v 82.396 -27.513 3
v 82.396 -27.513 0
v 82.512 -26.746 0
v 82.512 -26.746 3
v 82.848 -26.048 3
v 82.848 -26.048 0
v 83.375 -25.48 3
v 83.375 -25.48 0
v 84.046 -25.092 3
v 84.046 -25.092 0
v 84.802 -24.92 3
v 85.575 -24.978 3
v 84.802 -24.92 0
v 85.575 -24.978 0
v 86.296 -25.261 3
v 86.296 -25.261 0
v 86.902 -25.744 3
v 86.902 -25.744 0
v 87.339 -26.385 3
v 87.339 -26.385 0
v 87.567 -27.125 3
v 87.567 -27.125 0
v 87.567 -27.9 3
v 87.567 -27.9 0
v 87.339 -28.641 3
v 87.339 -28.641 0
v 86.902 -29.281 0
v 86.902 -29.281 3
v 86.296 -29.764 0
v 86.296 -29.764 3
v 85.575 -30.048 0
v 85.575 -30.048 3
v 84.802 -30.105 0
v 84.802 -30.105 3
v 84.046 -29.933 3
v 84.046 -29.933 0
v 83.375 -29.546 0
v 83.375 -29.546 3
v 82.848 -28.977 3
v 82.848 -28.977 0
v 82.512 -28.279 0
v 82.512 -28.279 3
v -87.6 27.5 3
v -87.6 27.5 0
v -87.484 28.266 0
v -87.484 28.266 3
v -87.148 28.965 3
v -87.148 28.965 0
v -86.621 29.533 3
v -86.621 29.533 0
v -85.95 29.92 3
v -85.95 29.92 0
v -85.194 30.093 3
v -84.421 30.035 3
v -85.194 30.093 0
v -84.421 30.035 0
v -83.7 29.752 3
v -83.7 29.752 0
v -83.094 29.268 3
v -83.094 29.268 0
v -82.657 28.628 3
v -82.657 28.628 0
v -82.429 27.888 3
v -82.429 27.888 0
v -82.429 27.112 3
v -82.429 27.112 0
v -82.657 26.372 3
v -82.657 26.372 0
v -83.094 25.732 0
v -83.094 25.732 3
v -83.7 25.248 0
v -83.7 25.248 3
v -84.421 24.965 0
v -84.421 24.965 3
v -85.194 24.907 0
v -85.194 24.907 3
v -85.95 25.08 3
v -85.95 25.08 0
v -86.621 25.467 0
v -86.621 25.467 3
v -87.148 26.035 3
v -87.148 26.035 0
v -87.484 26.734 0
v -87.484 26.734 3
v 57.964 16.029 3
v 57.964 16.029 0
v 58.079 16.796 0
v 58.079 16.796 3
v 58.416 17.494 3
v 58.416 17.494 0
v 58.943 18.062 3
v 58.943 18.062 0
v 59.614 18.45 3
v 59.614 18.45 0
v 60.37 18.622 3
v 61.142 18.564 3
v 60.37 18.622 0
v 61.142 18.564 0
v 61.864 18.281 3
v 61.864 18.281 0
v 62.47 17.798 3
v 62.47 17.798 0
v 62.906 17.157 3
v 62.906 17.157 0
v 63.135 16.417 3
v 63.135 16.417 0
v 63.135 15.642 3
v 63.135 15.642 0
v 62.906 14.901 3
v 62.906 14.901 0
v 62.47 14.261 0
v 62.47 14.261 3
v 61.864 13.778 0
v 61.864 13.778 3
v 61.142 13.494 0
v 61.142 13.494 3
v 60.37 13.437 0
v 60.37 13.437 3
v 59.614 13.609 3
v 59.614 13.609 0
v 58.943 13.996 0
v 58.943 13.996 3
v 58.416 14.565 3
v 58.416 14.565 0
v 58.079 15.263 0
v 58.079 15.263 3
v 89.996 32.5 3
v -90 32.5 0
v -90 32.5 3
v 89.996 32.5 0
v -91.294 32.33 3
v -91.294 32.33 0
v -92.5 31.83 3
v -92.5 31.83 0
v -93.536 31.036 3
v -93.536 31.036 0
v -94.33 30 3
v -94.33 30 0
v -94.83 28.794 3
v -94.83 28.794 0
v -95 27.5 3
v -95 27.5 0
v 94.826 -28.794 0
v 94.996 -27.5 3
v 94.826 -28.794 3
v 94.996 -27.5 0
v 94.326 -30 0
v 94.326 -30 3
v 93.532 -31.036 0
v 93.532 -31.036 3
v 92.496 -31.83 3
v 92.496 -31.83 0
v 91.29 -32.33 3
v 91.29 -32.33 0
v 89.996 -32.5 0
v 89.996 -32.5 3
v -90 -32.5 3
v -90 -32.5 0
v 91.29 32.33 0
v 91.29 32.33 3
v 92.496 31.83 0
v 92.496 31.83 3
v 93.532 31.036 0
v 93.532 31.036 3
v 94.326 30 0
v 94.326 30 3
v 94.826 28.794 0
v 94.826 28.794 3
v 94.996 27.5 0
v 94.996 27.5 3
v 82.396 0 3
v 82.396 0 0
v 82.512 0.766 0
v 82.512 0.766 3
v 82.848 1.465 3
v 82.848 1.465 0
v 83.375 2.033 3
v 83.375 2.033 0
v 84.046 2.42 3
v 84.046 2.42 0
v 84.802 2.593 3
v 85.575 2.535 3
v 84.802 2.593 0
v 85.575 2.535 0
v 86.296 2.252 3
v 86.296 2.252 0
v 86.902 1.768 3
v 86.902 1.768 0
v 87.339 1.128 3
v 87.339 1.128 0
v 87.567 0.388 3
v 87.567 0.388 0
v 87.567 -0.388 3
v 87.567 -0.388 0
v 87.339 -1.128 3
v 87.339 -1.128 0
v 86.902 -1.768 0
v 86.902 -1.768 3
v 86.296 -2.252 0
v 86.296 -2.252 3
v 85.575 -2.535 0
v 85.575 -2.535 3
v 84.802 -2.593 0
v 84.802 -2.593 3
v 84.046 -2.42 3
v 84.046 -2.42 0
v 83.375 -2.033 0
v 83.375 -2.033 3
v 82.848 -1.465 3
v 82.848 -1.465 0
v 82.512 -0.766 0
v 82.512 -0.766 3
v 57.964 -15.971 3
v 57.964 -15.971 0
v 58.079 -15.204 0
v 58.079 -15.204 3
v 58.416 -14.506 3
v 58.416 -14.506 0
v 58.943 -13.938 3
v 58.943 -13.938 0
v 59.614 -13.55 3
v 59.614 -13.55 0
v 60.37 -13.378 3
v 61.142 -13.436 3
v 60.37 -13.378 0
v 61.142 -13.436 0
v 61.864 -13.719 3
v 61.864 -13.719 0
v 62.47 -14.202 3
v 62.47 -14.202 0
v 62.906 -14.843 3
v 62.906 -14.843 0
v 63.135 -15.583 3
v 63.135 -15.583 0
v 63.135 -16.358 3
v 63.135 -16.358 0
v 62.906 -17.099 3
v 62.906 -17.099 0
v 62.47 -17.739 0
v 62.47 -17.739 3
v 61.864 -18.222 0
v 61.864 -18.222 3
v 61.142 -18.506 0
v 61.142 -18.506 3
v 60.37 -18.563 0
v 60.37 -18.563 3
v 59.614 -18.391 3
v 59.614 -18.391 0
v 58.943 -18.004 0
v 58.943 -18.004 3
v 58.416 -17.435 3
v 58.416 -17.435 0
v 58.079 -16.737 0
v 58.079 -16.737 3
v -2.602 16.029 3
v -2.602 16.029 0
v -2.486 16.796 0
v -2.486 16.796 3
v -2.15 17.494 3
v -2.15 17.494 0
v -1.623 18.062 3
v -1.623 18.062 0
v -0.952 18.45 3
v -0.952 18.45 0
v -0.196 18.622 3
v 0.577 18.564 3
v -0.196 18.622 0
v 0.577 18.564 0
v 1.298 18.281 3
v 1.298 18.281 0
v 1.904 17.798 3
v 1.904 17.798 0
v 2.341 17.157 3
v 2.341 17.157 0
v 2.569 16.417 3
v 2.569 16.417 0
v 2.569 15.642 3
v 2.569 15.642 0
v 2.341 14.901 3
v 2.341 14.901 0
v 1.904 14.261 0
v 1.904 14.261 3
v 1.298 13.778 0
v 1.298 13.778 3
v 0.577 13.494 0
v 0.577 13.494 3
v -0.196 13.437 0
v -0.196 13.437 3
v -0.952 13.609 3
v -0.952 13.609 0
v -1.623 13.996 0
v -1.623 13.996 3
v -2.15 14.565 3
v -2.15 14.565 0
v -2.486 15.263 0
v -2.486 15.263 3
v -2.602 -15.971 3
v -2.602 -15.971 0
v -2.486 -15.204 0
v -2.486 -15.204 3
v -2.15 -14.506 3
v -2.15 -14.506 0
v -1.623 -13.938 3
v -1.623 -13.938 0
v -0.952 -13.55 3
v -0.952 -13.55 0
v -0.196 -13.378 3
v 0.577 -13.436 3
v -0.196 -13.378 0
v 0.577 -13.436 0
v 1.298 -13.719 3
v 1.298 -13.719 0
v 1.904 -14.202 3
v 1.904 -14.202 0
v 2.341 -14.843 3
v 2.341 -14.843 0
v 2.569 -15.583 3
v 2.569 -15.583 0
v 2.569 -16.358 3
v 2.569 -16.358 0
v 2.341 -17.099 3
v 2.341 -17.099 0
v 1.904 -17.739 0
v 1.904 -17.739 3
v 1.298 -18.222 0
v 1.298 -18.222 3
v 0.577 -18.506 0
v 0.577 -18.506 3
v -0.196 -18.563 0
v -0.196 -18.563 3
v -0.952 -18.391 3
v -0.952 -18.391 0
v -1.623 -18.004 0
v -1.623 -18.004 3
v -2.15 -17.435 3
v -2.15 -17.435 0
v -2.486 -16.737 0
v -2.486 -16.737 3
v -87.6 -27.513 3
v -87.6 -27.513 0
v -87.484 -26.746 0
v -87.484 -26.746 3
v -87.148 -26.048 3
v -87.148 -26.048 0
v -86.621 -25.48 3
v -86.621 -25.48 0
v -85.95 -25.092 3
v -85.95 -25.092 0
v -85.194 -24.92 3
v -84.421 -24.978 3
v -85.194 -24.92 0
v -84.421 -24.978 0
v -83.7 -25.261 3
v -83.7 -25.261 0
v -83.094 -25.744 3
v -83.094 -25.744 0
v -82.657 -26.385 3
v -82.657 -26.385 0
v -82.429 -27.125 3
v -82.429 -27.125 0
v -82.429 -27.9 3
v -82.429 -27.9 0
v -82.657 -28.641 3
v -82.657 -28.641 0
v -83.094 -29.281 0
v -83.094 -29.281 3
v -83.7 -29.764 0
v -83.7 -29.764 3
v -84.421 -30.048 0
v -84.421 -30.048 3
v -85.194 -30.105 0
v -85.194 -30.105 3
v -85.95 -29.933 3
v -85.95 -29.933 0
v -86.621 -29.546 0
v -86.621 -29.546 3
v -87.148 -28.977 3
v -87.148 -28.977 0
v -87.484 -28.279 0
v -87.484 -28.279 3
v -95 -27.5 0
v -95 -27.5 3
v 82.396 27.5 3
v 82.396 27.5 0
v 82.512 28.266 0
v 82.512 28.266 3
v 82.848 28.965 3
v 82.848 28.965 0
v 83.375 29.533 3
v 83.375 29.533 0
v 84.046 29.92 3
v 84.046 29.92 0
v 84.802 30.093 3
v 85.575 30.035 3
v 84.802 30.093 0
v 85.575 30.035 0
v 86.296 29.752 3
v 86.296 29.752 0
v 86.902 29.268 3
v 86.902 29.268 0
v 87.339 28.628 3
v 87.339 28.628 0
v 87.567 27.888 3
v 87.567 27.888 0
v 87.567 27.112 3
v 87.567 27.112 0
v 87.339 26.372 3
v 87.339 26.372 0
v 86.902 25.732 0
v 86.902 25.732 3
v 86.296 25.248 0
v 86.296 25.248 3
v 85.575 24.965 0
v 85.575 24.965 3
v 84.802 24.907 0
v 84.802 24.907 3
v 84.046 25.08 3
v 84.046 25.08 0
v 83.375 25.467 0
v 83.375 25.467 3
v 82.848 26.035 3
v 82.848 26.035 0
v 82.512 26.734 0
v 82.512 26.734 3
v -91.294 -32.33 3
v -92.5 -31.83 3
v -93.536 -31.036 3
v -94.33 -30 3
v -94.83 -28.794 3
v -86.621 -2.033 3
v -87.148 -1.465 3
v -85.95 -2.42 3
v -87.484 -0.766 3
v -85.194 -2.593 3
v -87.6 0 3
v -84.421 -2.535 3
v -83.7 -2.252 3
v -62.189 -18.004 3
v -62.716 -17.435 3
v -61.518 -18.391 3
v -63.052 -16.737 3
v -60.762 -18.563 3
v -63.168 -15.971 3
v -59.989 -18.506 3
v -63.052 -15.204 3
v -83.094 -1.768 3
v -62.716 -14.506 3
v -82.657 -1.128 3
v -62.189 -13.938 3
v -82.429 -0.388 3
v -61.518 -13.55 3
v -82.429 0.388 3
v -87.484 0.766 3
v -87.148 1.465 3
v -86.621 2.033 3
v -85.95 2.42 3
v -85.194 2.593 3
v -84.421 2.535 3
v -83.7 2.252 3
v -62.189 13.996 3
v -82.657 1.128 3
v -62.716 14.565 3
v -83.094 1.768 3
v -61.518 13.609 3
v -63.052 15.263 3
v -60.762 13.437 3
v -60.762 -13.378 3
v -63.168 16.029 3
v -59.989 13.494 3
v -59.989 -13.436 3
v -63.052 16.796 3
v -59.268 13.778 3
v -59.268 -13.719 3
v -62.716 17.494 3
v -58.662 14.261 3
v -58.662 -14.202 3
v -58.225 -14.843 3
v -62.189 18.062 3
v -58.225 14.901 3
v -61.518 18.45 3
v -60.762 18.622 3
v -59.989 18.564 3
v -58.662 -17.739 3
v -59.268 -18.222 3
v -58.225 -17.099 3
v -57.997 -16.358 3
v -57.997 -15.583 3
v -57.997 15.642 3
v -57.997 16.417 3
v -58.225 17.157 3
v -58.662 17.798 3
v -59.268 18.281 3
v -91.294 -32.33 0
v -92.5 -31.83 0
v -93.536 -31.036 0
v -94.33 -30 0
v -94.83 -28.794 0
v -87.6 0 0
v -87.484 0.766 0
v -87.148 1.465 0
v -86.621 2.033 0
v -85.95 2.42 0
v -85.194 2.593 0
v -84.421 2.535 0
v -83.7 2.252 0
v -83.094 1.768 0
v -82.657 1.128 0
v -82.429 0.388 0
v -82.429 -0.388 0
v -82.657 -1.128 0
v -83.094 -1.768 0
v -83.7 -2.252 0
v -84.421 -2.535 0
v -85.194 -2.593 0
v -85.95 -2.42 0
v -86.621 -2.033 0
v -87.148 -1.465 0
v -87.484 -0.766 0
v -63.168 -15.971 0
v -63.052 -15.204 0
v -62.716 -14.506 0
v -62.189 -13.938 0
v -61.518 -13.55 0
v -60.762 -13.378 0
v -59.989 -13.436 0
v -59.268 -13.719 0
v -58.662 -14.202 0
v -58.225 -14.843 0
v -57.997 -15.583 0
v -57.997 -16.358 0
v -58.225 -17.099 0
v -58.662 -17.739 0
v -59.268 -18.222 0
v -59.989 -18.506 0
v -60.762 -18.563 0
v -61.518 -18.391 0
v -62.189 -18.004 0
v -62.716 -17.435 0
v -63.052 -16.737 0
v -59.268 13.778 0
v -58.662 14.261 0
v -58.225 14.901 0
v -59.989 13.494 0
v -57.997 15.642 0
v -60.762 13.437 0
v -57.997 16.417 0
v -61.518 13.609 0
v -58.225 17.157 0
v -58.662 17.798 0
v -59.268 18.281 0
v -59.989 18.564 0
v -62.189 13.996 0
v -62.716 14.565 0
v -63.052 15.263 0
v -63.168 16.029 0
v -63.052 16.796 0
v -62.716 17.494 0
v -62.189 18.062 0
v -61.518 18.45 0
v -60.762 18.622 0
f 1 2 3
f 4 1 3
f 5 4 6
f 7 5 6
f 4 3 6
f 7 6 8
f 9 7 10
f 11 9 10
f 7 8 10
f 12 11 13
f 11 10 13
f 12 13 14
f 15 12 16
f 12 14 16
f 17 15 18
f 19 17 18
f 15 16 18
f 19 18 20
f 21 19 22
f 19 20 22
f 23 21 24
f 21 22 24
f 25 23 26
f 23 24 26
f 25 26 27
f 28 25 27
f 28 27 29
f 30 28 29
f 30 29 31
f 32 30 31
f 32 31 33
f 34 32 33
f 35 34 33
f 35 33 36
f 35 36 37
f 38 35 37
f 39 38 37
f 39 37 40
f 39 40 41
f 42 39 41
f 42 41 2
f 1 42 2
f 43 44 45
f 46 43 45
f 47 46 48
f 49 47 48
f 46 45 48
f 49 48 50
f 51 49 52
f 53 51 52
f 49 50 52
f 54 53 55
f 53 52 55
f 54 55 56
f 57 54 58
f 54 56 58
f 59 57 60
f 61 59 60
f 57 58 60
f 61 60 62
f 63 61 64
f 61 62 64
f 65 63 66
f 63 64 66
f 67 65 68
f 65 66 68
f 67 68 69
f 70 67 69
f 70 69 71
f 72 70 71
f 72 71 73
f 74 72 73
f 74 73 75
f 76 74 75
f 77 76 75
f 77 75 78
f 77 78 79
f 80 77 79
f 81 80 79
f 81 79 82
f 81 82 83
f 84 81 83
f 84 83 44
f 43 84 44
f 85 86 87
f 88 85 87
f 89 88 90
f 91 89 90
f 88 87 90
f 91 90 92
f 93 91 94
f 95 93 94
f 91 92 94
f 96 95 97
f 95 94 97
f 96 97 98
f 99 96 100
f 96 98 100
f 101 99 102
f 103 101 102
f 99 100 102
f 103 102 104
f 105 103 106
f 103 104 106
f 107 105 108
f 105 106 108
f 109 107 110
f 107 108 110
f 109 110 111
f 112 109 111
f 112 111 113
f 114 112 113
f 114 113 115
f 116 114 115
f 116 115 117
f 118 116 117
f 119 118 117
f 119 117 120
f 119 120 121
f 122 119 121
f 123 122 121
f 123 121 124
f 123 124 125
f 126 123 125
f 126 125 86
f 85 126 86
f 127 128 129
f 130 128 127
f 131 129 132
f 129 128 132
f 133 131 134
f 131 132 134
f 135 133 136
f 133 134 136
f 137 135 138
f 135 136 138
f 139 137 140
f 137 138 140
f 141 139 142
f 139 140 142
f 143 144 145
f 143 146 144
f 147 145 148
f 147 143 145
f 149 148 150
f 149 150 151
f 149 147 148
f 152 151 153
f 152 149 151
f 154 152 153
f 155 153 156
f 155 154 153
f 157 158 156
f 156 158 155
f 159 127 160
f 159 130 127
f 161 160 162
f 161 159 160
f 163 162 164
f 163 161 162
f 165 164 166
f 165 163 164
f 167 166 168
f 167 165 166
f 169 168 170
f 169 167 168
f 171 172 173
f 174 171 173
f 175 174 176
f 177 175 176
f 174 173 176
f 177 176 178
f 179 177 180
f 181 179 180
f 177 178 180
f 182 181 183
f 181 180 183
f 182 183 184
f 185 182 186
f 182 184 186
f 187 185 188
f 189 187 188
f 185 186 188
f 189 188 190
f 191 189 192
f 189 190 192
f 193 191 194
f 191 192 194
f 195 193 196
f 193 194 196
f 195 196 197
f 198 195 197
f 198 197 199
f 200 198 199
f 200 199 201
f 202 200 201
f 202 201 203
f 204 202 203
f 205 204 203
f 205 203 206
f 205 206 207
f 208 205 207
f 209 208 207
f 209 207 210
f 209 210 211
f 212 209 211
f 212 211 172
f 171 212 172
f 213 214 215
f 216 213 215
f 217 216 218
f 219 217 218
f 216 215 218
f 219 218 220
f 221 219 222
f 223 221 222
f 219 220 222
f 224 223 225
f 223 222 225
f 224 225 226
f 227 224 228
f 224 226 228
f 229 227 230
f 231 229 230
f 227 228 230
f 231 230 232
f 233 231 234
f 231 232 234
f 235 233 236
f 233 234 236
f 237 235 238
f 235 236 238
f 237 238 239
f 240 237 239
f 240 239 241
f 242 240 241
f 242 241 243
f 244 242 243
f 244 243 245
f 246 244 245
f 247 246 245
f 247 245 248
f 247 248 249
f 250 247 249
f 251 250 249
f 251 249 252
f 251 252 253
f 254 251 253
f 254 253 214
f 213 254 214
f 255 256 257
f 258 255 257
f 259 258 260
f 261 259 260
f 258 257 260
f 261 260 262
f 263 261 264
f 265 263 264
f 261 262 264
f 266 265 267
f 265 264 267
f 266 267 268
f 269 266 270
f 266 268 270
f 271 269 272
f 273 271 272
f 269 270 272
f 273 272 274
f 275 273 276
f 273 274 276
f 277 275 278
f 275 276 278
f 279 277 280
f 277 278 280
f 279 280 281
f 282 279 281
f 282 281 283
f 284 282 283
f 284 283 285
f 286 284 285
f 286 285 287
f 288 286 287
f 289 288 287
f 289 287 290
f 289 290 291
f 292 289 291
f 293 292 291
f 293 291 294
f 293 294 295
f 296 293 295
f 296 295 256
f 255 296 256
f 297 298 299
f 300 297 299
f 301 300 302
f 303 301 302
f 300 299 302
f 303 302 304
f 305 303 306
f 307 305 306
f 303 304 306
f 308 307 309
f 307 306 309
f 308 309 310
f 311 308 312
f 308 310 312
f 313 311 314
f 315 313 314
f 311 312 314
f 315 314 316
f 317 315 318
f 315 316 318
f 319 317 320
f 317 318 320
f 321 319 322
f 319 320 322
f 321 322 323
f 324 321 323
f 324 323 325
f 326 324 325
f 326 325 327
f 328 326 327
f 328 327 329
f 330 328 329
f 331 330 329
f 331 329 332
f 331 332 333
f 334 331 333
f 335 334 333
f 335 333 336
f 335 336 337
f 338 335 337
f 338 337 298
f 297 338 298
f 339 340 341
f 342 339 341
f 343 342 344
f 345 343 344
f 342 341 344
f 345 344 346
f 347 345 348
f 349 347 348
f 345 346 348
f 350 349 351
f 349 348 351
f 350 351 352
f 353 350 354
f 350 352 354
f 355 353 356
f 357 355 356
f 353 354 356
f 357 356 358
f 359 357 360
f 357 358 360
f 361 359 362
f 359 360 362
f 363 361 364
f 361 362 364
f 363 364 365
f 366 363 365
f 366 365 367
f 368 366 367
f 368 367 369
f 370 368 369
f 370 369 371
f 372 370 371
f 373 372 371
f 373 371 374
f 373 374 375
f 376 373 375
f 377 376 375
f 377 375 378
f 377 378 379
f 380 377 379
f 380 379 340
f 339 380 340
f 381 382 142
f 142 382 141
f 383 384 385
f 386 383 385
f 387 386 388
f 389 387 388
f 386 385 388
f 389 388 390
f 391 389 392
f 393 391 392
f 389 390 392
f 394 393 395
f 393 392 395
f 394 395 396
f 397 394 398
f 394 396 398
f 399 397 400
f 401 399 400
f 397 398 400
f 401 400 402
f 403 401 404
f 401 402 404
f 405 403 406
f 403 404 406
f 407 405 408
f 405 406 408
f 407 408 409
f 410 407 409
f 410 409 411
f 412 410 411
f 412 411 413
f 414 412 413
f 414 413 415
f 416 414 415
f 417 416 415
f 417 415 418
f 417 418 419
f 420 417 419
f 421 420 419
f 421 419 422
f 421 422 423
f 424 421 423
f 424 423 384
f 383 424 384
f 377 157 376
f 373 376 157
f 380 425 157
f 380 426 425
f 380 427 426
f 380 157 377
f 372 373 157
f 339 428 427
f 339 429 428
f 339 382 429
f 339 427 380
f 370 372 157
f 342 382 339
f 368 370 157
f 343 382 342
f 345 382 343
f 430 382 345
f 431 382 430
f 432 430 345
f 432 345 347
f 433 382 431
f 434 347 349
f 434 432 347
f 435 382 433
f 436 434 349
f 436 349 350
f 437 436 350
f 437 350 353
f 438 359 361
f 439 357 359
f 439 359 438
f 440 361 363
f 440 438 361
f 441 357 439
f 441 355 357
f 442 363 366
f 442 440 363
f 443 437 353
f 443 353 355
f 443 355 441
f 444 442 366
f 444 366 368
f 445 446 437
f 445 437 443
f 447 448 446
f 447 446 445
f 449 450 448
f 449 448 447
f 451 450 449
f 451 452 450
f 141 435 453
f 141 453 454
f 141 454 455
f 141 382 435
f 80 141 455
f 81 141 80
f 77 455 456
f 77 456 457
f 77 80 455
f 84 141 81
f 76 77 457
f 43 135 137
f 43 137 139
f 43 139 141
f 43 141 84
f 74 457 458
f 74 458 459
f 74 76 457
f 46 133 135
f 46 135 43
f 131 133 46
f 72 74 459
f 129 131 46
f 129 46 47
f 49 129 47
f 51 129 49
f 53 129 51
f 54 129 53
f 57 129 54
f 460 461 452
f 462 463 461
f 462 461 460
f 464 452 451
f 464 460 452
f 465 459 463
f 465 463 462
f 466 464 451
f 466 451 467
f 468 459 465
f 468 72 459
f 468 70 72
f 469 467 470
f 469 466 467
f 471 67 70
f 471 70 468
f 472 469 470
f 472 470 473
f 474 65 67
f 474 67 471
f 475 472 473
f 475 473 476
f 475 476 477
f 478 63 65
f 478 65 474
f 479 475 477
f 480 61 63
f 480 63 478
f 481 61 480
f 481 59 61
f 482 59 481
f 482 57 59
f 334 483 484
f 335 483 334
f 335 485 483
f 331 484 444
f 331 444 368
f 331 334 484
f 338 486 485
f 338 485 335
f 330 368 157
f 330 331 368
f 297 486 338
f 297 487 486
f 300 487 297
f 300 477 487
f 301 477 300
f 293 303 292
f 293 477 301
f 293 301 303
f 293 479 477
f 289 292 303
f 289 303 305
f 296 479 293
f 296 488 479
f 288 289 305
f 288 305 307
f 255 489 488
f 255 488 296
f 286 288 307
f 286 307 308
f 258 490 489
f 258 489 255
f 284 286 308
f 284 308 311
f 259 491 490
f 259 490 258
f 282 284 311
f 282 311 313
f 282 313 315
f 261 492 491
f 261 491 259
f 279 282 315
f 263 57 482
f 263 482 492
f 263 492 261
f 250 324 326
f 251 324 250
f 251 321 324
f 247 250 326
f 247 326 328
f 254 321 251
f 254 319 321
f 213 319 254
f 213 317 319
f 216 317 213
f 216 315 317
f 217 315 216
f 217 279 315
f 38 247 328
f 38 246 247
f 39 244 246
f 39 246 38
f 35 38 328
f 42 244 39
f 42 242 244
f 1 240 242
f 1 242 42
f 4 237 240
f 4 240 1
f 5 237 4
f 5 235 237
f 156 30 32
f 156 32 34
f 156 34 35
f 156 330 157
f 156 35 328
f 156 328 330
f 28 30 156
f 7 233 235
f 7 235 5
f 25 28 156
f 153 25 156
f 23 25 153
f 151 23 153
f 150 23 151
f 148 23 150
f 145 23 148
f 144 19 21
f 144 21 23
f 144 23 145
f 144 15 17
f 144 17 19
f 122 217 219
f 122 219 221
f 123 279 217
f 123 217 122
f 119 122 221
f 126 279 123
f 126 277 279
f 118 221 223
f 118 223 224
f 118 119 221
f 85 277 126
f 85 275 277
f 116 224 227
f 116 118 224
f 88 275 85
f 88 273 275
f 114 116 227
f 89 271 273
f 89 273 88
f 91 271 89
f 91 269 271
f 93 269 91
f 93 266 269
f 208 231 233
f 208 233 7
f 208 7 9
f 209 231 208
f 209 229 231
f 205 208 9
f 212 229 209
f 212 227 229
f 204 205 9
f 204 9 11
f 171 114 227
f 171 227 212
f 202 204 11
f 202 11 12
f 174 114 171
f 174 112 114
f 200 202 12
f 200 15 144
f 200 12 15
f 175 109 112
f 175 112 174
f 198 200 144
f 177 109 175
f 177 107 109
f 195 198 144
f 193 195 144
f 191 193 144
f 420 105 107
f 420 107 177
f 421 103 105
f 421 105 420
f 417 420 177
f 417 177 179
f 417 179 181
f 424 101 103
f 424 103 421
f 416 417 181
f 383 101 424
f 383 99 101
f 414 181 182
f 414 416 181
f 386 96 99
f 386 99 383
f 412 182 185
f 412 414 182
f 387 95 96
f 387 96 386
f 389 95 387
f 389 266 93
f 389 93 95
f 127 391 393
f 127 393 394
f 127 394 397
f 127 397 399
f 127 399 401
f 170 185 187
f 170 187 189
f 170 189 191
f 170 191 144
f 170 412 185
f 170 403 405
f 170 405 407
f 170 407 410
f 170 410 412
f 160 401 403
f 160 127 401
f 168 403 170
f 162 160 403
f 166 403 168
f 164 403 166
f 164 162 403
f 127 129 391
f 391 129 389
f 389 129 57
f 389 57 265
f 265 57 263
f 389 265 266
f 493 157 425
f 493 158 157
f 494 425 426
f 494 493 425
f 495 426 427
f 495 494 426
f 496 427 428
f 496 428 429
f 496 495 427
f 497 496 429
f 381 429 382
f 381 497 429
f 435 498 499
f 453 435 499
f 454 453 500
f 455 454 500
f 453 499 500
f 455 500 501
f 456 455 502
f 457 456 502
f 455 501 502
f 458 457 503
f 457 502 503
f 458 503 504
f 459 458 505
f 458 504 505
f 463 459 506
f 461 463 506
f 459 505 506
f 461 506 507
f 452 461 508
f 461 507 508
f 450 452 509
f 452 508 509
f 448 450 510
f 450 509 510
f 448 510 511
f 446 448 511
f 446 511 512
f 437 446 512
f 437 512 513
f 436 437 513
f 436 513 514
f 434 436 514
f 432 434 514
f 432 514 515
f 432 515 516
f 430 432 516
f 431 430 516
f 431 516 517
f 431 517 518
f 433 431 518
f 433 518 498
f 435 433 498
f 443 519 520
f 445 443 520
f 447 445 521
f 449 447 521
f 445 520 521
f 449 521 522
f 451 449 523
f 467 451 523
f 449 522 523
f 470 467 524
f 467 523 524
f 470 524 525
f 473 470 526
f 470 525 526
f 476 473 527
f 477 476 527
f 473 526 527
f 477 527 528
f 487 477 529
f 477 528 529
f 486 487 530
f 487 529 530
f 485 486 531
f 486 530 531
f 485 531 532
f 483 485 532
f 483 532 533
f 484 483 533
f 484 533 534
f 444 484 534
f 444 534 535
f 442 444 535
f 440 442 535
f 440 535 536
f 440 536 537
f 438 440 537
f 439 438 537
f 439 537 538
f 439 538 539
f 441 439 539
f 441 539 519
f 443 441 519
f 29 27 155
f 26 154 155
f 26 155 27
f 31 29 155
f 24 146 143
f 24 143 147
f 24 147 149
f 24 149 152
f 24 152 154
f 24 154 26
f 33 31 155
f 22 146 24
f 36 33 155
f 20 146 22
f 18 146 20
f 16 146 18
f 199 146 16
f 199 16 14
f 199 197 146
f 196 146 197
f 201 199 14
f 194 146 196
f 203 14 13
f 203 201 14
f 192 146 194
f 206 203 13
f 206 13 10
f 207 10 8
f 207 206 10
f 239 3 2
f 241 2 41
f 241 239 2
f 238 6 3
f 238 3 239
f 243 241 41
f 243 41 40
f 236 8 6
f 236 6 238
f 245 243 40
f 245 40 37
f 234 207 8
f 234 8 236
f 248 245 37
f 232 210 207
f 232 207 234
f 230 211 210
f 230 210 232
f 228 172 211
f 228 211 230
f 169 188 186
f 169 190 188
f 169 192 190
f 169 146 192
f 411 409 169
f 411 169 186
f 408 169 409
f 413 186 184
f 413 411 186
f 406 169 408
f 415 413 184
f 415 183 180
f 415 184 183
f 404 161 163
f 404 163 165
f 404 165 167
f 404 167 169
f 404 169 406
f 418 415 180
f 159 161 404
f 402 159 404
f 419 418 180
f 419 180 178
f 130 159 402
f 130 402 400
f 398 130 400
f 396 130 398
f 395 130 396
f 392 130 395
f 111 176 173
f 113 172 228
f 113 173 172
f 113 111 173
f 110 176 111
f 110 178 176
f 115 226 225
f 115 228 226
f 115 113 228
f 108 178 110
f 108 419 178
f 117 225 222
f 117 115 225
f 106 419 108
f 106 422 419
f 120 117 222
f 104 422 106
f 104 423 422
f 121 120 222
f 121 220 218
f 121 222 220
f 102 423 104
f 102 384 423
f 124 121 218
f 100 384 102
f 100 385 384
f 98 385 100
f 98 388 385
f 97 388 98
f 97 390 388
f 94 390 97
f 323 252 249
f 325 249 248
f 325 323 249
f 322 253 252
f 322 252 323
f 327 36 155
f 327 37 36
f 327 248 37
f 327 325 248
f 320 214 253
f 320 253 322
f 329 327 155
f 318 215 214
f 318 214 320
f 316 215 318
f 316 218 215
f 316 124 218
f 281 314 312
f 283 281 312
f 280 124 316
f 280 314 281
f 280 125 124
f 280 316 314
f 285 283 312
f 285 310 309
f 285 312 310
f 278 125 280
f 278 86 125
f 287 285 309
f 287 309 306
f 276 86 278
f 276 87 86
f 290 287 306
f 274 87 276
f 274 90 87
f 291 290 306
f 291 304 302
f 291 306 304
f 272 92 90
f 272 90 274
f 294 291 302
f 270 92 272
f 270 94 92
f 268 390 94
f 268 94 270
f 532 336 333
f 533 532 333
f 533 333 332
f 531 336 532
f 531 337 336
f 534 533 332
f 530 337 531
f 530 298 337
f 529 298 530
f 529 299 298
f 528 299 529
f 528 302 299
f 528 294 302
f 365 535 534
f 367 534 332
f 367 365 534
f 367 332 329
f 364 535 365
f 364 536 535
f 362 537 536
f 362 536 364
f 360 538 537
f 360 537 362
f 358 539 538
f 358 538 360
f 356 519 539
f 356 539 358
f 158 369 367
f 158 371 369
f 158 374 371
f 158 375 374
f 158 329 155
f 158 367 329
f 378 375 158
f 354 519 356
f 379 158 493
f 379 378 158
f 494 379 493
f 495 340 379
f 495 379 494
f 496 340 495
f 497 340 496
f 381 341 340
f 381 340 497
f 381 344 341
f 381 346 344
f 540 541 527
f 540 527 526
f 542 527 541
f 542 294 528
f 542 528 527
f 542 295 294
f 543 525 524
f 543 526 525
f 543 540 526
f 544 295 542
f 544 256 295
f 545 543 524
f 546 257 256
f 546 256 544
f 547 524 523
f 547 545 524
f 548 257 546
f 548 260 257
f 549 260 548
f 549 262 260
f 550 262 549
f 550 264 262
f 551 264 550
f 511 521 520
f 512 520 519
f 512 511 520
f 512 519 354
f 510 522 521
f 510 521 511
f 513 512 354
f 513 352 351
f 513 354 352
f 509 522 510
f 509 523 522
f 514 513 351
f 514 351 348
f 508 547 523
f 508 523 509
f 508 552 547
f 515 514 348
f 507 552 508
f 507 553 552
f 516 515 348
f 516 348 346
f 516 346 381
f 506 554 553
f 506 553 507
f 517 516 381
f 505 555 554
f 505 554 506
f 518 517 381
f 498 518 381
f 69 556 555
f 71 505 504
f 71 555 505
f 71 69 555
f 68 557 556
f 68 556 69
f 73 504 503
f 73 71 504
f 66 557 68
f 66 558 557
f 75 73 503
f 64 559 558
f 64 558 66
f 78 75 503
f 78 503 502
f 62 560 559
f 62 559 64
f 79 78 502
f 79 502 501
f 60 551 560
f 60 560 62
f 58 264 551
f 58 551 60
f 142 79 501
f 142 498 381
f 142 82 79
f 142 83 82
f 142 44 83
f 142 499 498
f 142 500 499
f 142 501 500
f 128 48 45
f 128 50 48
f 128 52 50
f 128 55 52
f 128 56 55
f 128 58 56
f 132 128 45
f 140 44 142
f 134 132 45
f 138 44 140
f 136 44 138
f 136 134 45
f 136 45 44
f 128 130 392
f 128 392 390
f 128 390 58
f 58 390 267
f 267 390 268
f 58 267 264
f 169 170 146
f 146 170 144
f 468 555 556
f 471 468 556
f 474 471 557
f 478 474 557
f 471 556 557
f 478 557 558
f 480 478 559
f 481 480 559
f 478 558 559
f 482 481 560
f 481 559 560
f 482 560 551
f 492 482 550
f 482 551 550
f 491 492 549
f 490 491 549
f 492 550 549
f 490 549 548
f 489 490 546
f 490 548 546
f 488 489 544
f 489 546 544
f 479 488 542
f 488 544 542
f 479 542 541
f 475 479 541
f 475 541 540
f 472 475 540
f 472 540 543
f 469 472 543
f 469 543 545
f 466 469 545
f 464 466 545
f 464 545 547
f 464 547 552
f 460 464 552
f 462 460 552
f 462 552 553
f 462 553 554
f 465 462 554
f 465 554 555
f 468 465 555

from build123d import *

# Parameters (mm, degrees)
SKETCH_1_W           = 250
SKETCH_1_H           = 65
SKETCH_1_R           = 2.5
EXTRUDE_1_DEPTH      = 3
FILLET_1_R           = 3
CUT_EXTRUDE_3_DEPTH  = 4
FILLET_2_R           = 3
SKETCH_6_W           = 30
SKETCH_6_H           = 65
CUT_EXTRUDE_4_DEPTH  = 5
CUT_EXTRUDE_7_DEPTH  = 5
FILLET_3_R           = 5
SKETCH_8_R           = 2.5
EXTRUDE_2_DEPTH      = 3
SKETCH_10_R          = 2.5
CUT_EXTRUDE_8_DEPTH  = 3
SKETCH_13_R          = 2.5
EXTRUDE_3_DEPTH      = 3
SKETCH_15_R          = 2.5
EXTRUDE_4_DEPTH      = 3
SKETCH_18_R          = 2.5
CUT_EXTRUDE_11_DEPTH = 4
SKETCH_20_R          = 2.5
CUT_EXTRUDE_12_DEPTH = 10
SKETCH_21_R          = 2.6
CUT_EXTRUDE_13_DEPTH = 4


with BuildPart() as part:
    # 草图1 → 凸台-拉伸1 (new body)
    with BuildSketch(Plane.XY):
        Rectangle(SKETCH_1_W, SKETCH_1_H)
        with Locations((-70, 16)):
            Circle(SKETCH_1_R, mode=Mode.SUBTRACT)
        with Locations((-70, -16)):
            Circle(SKETCH_1_R, mode=Mode.SUBTRACT)
        with Locations((70, -16)):
            Circle(SKETCH_1_R, mode=Mode.SUBTRACT)
        with Locations((70, 16)):
            Circle(SKETCH_1_R, mode=Mode.SUBTRACT)
        with Locations((0, 16)):
            Circle(SKETCH_1_R, mode=Mode.SUBTRACT)
        with Locations((0, -16)):
            Circle(SKETCH_1_R, mode=Mode.SUBTRACT)
    extrude(amount=EXTRUDE_1_DEPTH)

    # 圆角1
    fillet_1_edges = [part.edges().sort_by_distance(p)[0] for p in [
        (125, -32.5, 1.5),
        (-125, -32.5, 1.5),
        (-125, 32.5, 1.5),
        (125, 32.5, 1.5),
    ]]
    fillet(fillet_1_edges, radius=FILLET_1_R)

    # 草图4 → 切除-拉伸3 (cut, through all)
    with BuildSketch(Plane(origin=(0, 0, 0), x_dir=(-1, 0, 0), z_dir=(0, 0, -1))):
        with BuildLine():
            Line((-113.82, 32.5), (-122, 32.5))
            ThreePointArc((-122, 32.5), (-124.121320344, 31.621320344), (-125, 29.5))
            Line((-125, 29.5), (-125, -29.5))
            ThreePointArc((-125, -29.5), (-124.121320344, -31.621320344), (-122, -32.5))
            Line((-122, -32.5), (-113.82, -32.5))
            Line((-113.82, -32.5), (-113.82, 32.5))
        make_face()
    extrude(amount=-CUT_EXTRUDE_3_DEPTH, mode=Mode.SUBTRACT)

    # 圆角2
    fillet_2_edges = [part.edges().sort_by_distance(p)[0] for p in [
        (113.82, 32.5, 1.5),
        (113.82, -32.5, 1.5),
    ]]
    fillet(fillet_2_edges, radius=FILLET_2_R)

    # 草图6 → 切除-拉伸4 (cut)
    with BuildSketch(Plane.XY.offset(3)):
        with Locations((-110, 0)):
            Rectangle(SKETCH_6_W, SKETCH_6_H)
    extrude(amount=-CUT_EXTRUDE_4_DEPTH, mode=Mode.SUBTRACT)

    # 草图7 → 切除-拉伸7 (cut)
    with BuildSketch(Plane.XY.offset(3)):
        Polygon((113.82, -32.860309594), (113.82, 33.556993736), (94.996170136, 32.5), (94.996170136, -32.5), align=None)
    extrude(amount=-CUT_EXTRUDE_7_DEPTH, mode=Mode.SUBTRACT)

    # 圆角3
    fillet_3_edges = [part.edges().sort_by_distance(p)[0] for p in [
        (-95, 32.5, 1.5),
        (-95, -32.5, 1.5),
        (94.996170136, -32.5, 1.5),
        (94.996170136, 32.5, 1.5),
    ]]
    fillet(fillet_3_edges, radius=FILLET_3_R)

    # 草图8 → 凸台-拉伸2 (add)
    with BuildSketch(Plane(origin=(0, 0, 0), x_dir=(-1, 0, 0), z_dir=(0, 0, -1))):
        with Locations((70, 16)):
            Circle(SKETCH_8_R)
        with Locations((70, -16)):
            Circle(SKETCH_8_R)
        with Locations((-70, 16)):
            Circle(SKETCH_8_R)
        with Locations((-70, -16)):
            Circle(SKETCH_8_R)
    extrude(amount=-EXTRUDE_2_DEPTH)

    # 草图10 → 切除-拉伸8 (cut)
    with BuildSketch(Plane(origin=(0, 0, 0), x_dir=(-1, 0, 0), z_dir=(0, 0, -1))):
        with Locations((-60.563944815, 16.029236842)):
            Circle(SKETCH_10_R)
        with Locations((-60.563944815, -15.970763158)):
            Circle(SKETCH_10_R)
        with Locations((62.89412836, 16.029236842)):
            Circle(SKETCH_10_R)
        with Locations((62.89412836, -15.970763158)):
            Circle(SKETCH_10_R)
    extrude(amount=-CUT_EXTRUDE_8_DEPTH, mode=Mode.SUBTRACT)

    # 草图13 → 凸台-拉伸3 (add)
    with BuildSketch(Plane(origin=(0, 0, 0), x_dir=(-1, 0, 0), z_dir=(0, 0, -1))):
        with Locations((62.89412836, 16.029236842)):
            Circle(SKETCH_13_R)
        with Locations((62.89412836, -15.970763158)):
            Circle(SKETCH_13_R)
    extrude(amount=-EXTRUDE_3_DEPTH)

    # 草图15 → 凸台-拉伸4 (add)
    with BuildSketch(Plane(origin=(0, 0, 0), x_dir=(-1, 0, 0), z_dir=(0, 0, -1))):
        with Locations((62.89412836, 16.029236843)):
            Circle(SKETCH_15_R)
        with Locations((62.89412836, -15.970763157)):
            Circle(SKETCH_15_R)
    extrude(amount=-EXTRUDE_4_DEPTH)

    # 草图18 → 切除-拉伸11 (cut, through all)
    with BuildSketch(Plane(origin=(0, 0, 0), x_dir=(-1, 0, 0), z_dir=(0, 0, -1))):
        with Locations((-84.996170136, 27.5)):
            Circle(SKETCH_18_R)
        with Locations((-84.996170136, -27.5)):
            Circle(SKETCH_18_R)
    cut_extrude_11 = extrude(amount=-CUT_EXTRUDE_11_DEPTH, mode=Mode.SUBTRACT)

    # 镜向1: 切除-拉伸11 across plane
    add(cut_extrude_11.mirror(Plane(origin=(-0.001914932, 0, 0), x_dir=(0, 0, 1), z_dir=(1, 0, 0))), mode=Mode.SUBTRACT)

    # 草图20 → 切除-拉伸12 (cut)
    with BuildSketch(Plane(origin=(0, 0, 0), x_dir=(-1, 0, 0), z_dir=(0, 0, -1))):
        with Locations((85, 0)):
            Circle(SKETCH_20_R)
        with Locations((-84.996170136, 0)):
            Circle(SKETCH_20_R)
    extrude(amount=-CUT_EXTRUDE_12_DEPTH, mode=Mode.SUBTRACT)

    # 草图21 → 切除-拉伸13 (cut, through all)
    with BuildSketch(Plane(origin=(0, 0, 0), x_dir=(-1, 0, 0), z_dir=(0, 0, -1))):
        with Locations((-84.996170136, 27.5)):
            Circle(SKETCH_21_R)
        with Locations((-60.563944815, 16.029236842)):
            Circle(SKETCH_21_R)
        with Locations((-84.996170136, 0)):
            Circle(SKETCH_21_R)
        with Locations((-60.563944815, -15.970763158)):
            Circle(SKETCH_21_R)
        with Locations((-84.996170136, -27.512746042)):
            Circle(SKETCH_21_R)
        with Locations((0.001914932, 16.029236842)):
            Circle(SKETCH_21_R)
        with Locations((0.001914932, -15.970763158)):
            Circle(SKETCH_21_R)
        with Locations((85, -27.512746042)):
            Circle(SKETCH_21_R)
        with Locations((60.567774678, -15.970763158)):
            Circle(SKETCH_21_R)
        with Locations((85, 0)):
            Circle(SKETCH_21_R)
        with Locations((60.567774678, 16.029236842)):
            Circle(SKETCH_21_R)
        with Locations((85, 27.5)):
            Circle(SKETCH_21_R)
    extrude(amount=-CUT_EXTRUDE_13_DEPTH, mode=Mode.SUBTRACT)


solid = part.part
